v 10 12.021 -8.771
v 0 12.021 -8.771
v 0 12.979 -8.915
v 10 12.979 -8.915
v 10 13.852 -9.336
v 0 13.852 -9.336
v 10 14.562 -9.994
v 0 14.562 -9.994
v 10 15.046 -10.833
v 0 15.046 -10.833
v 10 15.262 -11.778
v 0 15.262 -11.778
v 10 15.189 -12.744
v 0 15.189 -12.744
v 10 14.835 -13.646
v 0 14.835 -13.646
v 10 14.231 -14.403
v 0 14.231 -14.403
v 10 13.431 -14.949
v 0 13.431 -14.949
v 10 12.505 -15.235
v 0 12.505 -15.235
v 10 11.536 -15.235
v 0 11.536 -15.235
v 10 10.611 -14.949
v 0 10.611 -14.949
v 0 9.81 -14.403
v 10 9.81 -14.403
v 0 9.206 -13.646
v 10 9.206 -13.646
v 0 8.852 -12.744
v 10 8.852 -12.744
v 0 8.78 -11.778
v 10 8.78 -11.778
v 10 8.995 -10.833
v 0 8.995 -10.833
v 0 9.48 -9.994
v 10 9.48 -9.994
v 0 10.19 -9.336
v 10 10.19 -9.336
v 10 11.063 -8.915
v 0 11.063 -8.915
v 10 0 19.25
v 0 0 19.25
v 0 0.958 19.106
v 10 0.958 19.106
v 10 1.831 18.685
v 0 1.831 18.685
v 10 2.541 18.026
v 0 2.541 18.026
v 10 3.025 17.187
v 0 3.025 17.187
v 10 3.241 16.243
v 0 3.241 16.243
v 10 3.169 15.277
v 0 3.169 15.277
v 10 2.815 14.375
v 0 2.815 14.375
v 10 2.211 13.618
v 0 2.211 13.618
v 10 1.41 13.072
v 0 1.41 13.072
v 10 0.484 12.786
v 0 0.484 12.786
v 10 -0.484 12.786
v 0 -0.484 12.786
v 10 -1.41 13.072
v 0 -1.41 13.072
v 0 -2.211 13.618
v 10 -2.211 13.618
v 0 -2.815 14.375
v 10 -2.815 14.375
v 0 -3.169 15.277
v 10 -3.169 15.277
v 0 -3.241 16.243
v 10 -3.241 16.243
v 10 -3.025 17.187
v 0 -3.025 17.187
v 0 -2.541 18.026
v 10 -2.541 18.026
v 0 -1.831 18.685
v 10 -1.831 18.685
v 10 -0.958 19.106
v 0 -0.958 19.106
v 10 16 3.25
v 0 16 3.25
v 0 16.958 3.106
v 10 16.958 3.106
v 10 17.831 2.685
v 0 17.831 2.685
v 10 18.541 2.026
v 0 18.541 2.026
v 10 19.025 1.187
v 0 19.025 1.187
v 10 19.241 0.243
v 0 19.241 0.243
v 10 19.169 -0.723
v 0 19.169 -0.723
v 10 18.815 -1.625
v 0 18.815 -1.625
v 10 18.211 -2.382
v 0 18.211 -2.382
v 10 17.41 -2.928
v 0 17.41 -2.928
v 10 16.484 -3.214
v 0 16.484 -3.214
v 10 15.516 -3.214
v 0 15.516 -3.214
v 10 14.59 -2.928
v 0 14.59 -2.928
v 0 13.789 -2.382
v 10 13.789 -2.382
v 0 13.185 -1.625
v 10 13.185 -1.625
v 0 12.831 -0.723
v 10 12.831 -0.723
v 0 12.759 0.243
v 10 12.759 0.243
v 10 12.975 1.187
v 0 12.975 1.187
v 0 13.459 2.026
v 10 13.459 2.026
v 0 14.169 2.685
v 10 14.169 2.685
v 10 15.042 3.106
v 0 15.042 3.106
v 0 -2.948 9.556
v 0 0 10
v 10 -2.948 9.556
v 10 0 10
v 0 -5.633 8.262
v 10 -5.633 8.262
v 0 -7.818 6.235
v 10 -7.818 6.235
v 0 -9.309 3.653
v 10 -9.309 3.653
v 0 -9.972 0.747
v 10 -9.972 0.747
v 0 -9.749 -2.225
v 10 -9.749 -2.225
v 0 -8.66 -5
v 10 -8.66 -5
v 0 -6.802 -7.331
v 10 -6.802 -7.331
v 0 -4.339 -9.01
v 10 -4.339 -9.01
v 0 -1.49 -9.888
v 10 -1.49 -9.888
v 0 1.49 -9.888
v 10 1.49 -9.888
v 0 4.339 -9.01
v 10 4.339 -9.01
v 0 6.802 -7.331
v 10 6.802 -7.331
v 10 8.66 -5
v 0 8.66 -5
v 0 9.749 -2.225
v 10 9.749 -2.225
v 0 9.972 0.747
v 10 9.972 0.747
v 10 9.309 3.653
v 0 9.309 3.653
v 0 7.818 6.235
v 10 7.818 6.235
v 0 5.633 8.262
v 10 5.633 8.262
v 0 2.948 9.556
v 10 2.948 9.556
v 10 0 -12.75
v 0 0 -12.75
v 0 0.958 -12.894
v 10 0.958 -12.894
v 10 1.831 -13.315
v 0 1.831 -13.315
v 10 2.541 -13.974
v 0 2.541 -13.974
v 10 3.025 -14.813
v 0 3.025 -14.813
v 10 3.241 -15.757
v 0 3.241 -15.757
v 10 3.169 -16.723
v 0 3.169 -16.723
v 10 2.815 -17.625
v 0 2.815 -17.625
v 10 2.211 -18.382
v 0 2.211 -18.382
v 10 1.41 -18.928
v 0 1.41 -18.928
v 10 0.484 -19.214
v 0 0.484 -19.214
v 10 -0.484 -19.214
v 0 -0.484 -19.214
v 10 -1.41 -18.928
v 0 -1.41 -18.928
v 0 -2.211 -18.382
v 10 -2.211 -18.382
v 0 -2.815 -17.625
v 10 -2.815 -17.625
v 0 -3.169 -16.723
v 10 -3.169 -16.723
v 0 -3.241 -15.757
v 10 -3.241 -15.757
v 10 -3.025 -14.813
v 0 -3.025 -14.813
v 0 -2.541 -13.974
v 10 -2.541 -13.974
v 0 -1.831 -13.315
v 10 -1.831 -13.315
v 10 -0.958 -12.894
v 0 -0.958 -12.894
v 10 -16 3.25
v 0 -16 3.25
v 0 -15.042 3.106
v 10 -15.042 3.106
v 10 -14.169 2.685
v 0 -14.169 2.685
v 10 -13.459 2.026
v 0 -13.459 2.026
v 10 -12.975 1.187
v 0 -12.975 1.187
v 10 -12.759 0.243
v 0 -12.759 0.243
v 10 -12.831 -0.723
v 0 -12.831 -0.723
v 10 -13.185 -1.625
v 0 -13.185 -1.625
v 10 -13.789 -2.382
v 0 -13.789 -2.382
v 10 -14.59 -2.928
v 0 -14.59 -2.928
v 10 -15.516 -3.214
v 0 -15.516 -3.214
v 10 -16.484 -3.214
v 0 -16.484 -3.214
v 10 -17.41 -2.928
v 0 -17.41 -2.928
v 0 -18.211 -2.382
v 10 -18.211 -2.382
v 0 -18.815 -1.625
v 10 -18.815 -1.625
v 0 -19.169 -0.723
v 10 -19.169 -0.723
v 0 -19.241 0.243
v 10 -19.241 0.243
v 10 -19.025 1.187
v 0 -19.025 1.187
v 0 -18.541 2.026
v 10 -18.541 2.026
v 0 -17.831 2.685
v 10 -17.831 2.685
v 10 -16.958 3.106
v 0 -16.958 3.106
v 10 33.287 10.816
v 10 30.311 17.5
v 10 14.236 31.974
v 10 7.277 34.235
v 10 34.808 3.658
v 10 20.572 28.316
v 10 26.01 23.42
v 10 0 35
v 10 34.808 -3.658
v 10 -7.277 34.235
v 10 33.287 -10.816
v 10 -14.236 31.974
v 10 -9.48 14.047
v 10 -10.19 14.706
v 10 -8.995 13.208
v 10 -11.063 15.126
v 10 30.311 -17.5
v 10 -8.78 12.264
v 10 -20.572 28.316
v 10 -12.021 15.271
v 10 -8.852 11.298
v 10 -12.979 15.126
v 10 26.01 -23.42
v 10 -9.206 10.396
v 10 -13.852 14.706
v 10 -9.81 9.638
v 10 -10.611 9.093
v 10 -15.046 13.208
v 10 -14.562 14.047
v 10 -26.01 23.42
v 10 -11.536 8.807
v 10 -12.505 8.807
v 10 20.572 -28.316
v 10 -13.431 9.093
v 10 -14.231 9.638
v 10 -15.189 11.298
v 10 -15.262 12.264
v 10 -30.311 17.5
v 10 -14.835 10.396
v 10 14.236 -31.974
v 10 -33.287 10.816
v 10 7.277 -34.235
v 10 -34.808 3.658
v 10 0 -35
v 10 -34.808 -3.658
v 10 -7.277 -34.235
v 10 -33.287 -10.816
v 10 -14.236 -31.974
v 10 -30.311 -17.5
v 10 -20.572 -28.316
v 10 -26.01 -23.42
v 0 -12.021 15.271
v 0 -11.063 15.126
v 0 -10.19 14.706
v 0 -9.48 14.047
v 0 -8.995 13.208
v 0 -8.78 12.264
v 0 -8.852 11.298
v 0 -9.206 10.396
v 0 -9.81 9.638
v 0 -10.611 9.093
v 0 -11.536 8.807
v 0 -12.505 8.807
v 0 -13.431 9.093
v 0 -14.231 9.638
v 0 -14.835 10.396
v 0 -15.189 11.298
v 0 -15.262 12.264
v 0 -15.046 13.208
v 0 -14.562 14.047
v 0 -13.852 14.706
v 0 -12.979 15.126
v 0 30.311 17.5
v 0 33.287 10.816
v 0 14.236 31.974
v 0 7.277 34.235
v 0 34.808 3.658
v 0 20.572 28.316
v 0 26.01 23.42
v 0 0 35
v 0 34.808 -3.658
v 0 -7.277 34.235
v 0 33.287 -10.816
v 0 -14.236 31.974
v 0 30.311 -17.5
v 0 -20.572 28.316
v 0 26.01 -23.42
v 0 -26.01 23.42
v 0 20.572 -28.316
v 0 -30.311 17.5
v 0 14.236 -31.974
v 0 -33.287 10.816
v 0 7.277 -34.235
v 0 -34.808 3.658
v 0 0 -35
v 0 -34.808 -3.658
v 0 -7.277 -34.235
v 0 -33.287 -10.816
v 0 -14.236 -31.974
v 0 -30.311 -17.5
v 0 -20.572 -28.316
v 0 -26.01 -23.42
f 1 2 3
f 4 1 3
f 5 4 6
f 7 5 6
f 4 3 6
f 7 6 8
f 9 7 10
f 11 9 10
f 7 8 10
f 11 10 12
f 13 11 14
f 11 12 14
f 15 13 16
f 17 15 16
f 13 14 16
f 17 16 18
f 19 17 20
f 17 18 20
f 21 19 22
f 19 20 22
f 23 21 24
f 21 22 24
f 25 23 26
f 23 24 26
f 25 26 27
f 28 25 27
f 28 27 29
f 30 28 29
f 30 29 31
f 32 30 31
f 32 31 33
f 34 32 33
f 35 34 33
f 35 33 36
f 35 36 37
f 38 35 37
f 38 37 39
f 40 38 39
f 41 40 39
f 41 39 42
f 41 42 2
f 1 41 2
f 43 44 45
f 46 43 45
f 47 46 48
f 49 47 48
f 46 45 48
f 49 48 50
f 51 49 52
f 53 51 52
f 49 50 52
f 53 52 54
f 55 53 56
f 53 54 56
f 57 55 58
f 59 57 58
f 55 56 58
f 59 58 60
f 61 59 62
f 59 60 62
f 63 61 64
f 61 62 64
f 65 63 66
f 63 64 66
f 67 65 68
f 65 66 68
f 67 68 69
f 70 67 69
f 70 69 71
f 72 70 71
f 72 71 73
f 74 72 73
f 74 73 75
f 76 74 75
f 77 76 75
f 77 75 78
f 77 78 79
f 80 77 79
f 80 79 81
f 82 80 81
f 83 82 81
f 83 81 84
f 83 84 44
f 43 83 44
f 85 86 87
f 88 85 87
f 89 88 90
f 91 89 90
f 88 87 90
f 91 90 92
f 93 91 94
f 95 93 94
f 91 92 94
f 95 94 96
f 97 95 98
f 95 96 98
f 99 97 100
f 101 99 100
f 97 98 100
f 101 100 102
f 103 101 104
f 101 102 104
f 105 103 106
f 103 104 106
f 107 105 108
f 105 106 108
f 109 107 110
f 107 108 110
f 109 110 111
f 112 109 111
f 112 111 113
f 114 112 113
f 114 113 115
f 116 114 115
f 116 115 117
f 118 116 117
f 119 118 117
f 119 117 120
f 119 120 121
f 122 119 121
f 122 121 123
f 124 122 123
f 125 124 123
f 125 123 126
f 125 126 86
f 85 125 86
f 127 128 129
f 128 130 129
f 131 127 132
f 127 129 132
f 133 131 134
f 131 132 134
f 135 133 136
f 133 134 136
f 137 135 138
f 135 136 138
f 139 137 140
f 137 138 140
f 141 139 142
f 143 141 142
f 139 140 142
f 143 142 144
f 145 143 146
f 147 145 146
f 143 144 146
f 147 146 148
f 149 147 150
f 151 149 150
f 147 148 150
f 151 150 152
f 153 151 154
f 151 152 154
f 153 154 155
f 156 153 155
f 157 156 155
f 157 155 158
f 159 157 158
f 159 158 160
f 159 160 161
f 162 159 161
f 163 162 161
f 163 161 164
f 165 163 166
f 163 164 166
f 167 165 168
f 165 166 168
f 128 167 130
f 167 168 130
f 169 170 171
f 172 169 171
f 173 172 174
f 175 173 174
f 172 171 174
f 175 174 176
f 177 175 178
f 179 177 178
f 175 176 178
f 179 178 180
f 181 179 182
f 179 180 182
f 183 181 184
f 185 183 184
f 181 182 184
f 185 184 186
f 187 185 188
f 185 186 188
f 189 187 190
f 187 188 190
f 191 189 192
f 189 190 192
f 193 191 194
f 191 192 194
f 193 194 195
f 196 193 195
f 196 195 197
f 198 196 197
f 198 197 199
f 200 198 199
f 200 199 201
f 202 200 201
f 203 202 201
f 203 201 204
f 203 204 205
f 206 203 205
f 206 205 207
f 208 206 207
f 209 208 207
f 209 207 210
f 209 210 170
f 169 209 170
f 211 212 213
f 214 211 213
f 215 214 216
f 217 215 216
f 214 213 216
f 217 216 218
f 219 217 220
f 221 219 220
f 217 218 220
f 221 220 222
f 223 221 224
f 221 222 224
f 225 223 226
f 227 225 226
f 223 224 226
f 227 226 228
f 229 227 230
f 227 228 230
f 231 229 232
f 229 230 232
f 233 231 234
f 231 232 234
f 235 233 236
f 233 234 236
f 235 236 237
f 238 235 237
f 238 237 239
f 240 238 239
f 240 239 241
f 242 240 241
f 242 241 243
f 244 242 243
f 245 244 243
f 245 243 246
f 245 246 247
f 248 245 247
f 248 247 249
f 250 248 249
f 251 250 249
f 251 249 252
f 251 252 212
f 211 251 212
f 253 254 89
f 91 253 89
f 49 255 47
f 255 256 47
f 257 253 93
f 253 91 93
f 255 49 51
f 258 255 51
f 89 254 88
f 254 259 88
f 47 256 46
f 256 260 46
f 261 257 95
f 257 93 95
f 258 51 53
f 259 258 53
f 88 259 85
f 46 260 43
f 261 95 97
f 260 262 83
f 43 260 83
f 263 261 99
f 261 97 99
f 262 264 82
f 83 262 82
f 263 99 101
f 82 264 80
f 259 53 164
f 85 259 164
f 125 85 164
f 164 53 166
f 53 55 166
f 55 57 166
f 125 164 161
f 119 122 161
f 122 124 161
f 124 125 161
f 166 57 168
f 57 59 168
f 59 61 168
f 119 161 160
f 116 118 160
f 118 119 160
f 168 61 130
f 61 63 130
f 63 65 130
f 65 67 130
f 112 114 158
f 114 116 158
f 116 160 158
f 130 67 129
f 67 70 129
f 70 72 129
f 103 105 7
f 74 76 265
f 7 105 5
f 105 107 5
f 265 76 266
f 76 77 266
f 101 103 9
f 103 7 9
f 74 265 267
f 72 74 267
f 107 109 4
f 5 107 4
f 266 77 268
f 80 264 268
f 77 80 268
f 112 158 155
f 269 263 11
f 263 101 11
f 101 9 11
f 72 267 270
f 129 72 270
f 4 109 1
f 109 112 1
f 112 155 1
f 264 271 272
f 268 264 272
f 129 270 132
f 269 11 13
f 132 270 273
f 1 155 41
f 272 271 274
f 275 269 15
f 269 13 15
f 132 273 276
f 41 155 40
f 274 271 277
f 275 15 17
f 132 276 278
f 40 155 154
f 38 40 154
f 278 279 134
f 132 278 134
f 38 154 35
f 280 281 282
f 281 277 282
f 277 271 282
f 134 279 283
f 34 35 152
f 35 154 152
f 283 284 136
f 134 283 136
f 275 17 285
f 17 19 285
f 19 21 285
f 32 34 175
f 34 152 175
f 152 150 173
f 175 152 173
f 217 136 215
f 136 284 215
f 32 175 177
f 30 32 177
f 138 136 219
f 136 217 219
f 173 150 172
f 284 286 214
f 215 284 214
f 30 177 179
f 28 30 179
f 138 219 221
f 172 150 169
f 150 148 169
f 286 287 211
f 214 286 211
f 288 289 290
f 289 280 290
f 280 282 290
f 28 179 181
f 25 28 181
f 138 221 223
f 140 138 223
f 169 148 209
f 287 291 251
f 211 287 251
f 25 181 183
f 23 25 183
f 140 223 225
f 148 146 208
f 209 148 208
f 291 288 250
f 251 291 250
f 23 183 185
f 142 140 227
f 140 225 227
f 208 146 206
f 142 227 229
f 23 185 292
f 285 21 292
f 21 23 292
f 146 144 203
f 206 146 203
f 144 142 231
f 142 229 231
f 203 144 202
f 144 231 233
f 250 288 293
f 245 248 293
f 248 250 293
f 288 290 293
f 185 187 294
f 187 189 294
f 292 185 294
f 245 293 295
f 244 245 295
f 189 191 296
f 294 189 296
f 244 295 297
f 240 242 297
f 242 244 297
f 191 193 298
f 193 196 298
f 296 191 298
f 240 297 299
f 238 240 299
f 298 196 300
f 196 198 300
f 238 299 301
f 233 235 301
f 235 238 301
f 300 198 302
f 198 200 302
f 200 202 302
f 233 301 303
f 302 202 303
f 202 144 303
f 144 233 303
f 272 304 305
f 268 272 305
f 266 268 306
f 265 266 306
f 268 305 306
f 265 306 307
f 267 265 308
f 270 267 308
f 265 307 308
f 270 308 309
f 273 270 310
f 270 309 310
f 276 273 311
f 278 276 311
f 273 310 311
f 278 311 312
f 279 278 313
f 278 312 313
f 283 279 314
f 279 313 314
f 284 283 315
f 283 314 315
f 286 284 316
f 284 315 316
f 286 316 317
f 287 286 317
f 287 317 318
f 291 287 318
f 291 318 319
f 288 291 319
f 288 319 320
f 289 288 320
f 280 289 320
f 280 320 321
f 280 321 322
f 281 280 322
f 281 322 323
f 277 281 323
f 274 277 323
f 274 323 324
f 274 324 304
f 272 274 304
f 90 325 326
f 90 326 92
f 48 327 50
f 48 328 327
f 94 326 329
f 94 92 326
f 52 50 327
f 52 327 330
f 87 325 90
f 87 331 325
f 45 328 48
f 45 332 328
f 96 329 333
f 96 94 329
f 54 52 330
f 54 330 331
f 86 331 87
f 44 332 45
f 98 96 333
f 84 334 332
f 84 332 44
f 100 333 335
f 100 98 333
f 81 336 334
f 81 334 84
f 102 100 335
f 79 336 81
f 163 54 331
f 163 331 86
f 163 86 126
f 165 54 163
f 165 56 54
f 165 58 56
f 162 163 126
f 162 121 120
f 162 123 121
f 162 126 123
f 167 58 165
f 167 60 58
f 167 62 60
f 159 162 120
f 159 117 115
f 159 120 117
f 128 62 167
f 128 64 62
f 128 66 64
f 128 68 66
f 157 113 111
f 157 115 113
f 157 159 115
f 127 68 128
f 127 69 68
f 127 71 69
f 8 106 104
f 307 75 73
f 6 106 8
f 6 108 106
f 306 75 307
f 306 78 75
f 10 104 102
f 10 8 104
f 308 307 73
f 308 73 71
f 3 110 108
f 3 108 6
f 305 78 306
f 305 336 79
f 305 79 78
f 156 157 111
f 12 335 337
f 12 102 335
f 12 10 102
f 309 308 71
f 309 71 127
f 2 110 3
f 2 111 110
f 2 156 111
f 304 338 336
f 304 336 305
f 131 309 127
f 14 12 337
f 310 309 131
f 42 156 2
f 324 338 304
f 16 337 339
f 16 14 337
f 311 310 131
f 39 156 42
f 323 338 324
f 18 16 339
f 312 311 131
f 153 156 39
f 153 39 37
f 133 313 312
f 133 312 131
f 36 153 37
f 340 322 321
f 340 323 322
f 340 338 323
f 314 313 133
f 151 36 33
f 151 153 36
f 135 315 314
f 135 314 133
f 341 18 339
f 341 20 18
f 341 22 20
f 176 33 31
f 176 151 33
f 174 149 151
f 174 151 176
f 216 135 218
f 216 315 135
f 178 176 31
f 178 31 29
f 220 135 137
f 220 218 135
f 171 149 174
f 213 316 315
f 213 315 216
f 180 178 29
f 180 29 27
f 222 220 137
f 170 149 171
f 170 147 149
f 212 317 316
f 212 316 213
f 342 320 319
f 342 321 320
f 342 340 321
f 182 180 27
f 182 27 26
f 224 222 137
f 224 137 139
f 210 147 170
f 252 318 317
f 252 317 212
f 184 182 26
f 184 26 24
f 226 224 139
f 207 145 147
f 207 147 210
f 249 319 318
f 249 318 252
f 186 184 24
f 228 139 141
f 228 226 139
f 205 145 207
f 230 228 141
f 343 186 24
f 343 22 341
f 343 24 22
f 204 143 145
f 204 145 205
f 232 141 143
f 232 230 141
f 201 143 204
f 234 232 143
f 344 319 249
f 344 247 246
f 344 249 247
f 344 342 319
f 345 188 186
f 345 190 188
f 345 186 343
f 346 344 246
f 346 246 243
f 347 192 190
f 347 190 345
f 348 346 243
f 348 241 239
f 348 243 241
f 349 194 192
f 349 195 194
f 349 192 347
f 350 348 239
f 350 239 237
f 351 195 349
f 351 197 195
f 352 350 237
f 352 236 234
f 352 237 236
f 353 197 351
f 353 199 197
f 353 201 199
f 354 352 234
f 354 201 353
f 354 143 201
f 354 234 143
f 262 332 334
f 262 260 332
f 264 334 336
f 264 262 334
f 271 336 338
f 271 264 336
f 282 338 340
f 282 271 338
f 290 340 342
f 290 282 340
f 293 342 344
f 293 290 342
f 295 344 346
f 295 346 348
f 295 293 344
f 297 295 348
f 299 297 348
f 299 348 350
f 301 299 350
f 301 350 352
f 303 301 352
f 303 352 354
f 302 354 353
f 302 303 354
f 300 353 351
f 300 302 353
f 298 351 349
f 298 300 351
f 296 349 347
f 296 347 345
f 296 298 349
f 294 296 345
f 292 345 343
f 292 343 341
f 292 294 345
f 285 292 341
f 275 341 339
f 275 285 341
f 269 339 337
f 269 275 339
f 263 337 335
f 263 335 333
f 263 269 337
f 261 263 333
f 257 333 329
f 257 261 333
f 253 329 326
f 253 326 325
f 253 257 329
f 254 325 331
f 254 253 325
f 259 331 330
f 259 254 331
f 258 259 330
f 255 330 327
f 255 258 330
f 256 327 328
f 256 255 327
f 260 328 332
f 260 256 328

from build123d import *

# Parameters (mm, degrees)
SKETCH1_W        = 10
SKETCH1_H        = 25
DIAMETER_HOLE1_D = 6.5
DIAMETER_HOLE2_D = 6.5


with BuildPart() as part:
    # Sketch1 → Revolve1 (revolve)
    with BuildSketch(Plane.XY, mode=Mode.PRIVATE) as revolve1_sk:
        with Locations((5, 22.5)):
            Rectangle(SKETCH1_W, SKETCH1_H)
    revolve(revolve1_sk.sketch.rotate(Axis((0, 0, 0), (1, 0, 0)), 90), axis=Axis((0, 0, 0), (1, 0, 0)))

    # Diameter Hole1 (through all)
    with Locations(Plane(origin=(10, 0, 0), x_dir=(0, 0, -1), z_dir=(1, 0, 0))):
        with Locations((-16, 0), (0, 16), (16, 0), (0, -16)):
            Hole(DIAMETER_HOLE1_D / 2)

    # Diameter Hole2 (through all)
    with Locations(Plane(origin=(10, 0, 0), x_dir=(0, 0, -1), z_dir=(1, 0, 0))):
        with Locations((-12.02081528, -12.02081528), (12.02081528, 12.02081528)):
            Hole(DIAMETER_HOLE2_D / 2)


solid = part.part
